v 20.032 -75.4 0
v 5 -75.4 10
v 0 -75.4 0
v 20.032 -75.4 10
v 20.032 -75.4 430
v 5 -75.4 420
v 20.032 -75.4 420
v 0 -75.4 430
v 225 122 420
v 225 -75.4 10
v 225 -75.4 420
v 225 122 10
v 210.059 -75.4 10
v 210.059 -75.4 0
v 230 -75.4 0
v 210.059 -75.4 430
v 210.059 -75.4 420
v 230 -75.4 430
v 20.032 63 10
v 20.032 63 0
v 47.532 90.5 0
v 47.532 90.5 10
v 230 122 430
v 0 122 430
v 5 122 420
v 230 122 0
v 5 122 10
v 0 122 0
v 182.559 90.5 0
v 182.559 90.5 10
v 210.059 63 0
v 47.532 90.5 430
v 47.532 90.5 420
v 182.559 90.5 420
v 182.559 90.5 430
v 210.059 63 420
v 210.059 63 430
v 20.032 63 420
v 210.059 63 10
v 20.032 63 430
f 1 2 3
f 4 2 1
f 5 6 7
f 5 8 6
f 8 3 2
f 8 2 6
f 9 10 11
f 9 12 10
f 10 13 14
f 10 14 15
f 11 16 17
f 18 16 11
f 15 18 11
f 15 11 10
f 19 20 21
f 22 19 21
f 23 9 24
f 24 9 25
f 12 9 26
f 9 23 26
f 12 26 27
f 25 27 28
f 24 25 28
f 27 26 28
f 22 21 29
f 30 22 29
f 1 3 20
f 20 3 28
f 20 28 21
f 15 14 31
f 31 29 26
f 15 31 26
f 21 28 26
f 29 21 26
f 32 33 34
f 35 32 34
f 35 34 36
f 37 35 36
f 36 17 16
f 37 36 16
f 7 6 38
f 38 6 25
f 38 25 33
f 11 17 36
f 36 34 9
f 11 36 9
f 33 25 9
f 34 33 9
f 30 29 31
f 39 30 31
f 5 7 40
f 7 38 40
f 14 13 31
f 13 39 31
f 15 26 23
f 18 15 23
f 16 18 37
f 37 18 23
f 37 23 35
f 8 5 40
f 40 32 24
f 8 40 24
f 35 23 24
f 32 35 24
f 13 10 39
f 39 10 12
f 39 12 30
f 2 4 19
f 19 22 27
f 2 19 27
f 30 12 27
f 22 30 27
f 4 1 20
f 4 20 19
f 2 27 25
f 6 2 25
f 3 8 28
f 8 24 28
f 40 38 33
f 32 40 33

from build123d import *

# Parameters (mm, degrees)
BOSS_EXTRUDE5_DEPTH  = 430
SKETCH6_W            = 220
SKETCH6_H            = 410
CUT_EXTRUDE5_DEPTH   = 430
SKETCH7_W            = 7
SKETCH7_H            = 30
BOSS_EXTRUDE6_DEPTH  = 30
SKETCH8_W            = 7
SKETCH8_H            = 30
BOSS_EXTRUDE7_DEPTH  = 30
BOSS_EXTRUDE8_DEPTH  = 28
CUT_EXTRUDE6_DEPTH   = 430
BOSS_EXTRUDE9_DEPTH  = 38.4
SKETCH12_W           = 430
SKETCH12_H           = 6
CUT_EXTRUDE7_DEPTH   = 500
SKETCH13_W           = 15.031983572
SKETCH13_H           = 10
BOSS_EXTRUDE10_DEPTH = 15
SKETCH14_W           = 14.940905272
SKETCH14_H           = 10
SKETCH14_W_2         = 5
SKETCH14_H_2         = 410
BOSS_EXTRUDE11_DEPTH = 15


with BuildPart() as part:
    # Sketch1 → Boss-Extrude5 (new body)
    with BuildSketch(Plane.XY):
        Polygon((230, 122), (0, 122), (0, 0), (50, 0), (50, 30), (28.531983572, 30), (28.531983572, 38.499978431), (20.031983572, 38.499978431), (20.031983572, 62.999978431), (47.532005141, 90.5), (182.467994859, 90.5), (182.559073159, 90.5), (210.059094728, 62.999978431), (210.059094728, 38.499978431), (209.968016428, 38.499978431), (201.559094728, 38.499978431), (201.559094728, 30), (201.468016428, 30), (180, 30), (180, 0), (230, 0), align=None)
    extrude(amount=BOSS_EXTRUDE5_DEPTH)

    # Sketch6 → Cut-Extrude5 (cut)
    with BuildSketch(Plane(origin=(0, 122, 0), x_dir=(1, 0, 0), z_dir=(0, 1, 0))):
        with Locations((115, -215)):
            Rectangle(SKETCH6_W, SKETCH6_H)
    extrude(amount=-CUT_EXTRUDE5_DEPTH, mode=Mode.SUBTRACT)

    # Sketch7 → Boss-Extrude6 (add)
    with BuildSketch(Plane.XY.offset(10)):
        with Locations((46.5, 15)):
            Rectangle(SKETCH7_W, SKETCH7_H)
        with Locations((183.5, 15)):
            Rectangle(SKETCH7_W, SKETCH7_H)
    extrude(amount=BOSS_EXTRUDE6_DEPTH)

    # Sketch8 → Boss-Extrude7 (add)
    with BuildSketch(Plane(origin=(0, 0, 420), x_dir=(-1, 0, 0), z_dir=(0, 0, -1))):
        with Locations((-183.5, 15)):
            Rectangle(SKETCH8_W, SKETCH8_H)
        with Locations((-46.5, 15)):
            Rectangle(SKETCH8_W, SKETCH8_H)
    extrude(amount=BOSS_EXTRUDE7_DEPTH)

    # Sketch9 → Boss-Extrude8 (add)
    with BuildSketch(Plane.XZ):
        Polygon((50, 430), (0, 430), (0, 0), (50, 0), (50, 40), (43, 40), (43, 10), (5, 10), (5, 420), (43, 420), (43, 390), (50, 390), align=None)
        Polygon((187, 420), (225, 420), (225, 10), (187, 10), (187, 40), (180, 40), (180, 0), (230, 0), (230, 430), (180, 430), (180, 390), (187, 390), align=None)
    extrude(amount=BOSS_EXTRUDE8_DEPTH)

    # Sketch10 → Cut-Extrude6 (cut)
    with BuildSketch(Plane(origin=(0, 0, 0), x_dir=(-1, 0, 0), z_dir=(0, 0, -1))):
        Polygon((-201.559094728, 38.499978431), (-210.059094728, 38.499978431), (-210.059094728, -28), (-180, -28), (-180, 30), (-201.559094728, 30), align=None)
        Polygon((-28.531983572, 30), (-50, 30), (-50, -28), (-20.031983572, -28), (-20.031983572, 30), (-20.031983572, 38.499978431), (-28.531983572, 38.499978431), align=None)
    extrude(amount=-CUT_EXTRUDE6_DEPTH, mode=Mode.SUBTRACT)

    # Sketch11 → Boss-Extrude9 (add)
    with BuildSketch(Plane.XZ.offset(28)):
        Polygon((230, 0), (225, 0), (210.059094728, 0), (210.059094728, 10), (225, 10), (225, 420), (210.059094728, 420), (210.059094728, 430), (230, 430), (230, 420), align=None)
        Polygon((5, 10), (5, 420), (20.031983572, 420), (20.031983572, 430), (5, 430), (0, 430), (0, 10), (0, 0), (20.031983572, 0), (20.031983572, 10), align=None)
    extrude(amount=BOSS_EXTRUDE9_DEPTH)

    # Sketch12 → Cut-Extrude7 (cut)
    with BuildSketch(Plane.ZY):
        with Locations((215, -63.4)):
            Rectangle(SKETCH12_W, SKETCH12_H)
    extrude(amount=-CUT_EXTRUDE7_DEPTH, mode=Mode.SUBTRACT)

    # Sketch13 → Boss-Extrude10 (add)
    with BuildSketch(Plane.XZ.offset(60.4)):
        with Locations((12.515991786, 425)):
            Rectangle(SKETCH13_W, SKETCH13_H)
        Polygon((5, 430), (0, 430), (0, 10), (5, 10), (5, 420), align=None)
        Polygon((5, 10), (0, 10), (0, 0), (20.031983572, 0), (20.031983572, 10), align=None)
    extrude(amount=BOSS_EXTRUDE10_DEPTH)

    # Sketch14 → Boss-Extrude11 (add)
    with BuildSketch(Plane.XZ.offset(60.4)):
        with Locations((217.529547364, 425)):
            Rectangle(SKETCH14_W, SKETCH14_H)
        with Locations((227.5, 425)):
            Rectangle(SKETCH14_W_2, SKETCH14_H)
        with Locations((227.5, 215)):
            Rectangle(SKETCH14_W_2, SKETCH14_H_2)
        Polygon((230, 0), (230, 10), (225, 10), (210.059094728, 10), (210.059094728, 0), align=None)
    extrude(amount=BOSS_EXTRUDE11_DEPTH)


solid = part.part
